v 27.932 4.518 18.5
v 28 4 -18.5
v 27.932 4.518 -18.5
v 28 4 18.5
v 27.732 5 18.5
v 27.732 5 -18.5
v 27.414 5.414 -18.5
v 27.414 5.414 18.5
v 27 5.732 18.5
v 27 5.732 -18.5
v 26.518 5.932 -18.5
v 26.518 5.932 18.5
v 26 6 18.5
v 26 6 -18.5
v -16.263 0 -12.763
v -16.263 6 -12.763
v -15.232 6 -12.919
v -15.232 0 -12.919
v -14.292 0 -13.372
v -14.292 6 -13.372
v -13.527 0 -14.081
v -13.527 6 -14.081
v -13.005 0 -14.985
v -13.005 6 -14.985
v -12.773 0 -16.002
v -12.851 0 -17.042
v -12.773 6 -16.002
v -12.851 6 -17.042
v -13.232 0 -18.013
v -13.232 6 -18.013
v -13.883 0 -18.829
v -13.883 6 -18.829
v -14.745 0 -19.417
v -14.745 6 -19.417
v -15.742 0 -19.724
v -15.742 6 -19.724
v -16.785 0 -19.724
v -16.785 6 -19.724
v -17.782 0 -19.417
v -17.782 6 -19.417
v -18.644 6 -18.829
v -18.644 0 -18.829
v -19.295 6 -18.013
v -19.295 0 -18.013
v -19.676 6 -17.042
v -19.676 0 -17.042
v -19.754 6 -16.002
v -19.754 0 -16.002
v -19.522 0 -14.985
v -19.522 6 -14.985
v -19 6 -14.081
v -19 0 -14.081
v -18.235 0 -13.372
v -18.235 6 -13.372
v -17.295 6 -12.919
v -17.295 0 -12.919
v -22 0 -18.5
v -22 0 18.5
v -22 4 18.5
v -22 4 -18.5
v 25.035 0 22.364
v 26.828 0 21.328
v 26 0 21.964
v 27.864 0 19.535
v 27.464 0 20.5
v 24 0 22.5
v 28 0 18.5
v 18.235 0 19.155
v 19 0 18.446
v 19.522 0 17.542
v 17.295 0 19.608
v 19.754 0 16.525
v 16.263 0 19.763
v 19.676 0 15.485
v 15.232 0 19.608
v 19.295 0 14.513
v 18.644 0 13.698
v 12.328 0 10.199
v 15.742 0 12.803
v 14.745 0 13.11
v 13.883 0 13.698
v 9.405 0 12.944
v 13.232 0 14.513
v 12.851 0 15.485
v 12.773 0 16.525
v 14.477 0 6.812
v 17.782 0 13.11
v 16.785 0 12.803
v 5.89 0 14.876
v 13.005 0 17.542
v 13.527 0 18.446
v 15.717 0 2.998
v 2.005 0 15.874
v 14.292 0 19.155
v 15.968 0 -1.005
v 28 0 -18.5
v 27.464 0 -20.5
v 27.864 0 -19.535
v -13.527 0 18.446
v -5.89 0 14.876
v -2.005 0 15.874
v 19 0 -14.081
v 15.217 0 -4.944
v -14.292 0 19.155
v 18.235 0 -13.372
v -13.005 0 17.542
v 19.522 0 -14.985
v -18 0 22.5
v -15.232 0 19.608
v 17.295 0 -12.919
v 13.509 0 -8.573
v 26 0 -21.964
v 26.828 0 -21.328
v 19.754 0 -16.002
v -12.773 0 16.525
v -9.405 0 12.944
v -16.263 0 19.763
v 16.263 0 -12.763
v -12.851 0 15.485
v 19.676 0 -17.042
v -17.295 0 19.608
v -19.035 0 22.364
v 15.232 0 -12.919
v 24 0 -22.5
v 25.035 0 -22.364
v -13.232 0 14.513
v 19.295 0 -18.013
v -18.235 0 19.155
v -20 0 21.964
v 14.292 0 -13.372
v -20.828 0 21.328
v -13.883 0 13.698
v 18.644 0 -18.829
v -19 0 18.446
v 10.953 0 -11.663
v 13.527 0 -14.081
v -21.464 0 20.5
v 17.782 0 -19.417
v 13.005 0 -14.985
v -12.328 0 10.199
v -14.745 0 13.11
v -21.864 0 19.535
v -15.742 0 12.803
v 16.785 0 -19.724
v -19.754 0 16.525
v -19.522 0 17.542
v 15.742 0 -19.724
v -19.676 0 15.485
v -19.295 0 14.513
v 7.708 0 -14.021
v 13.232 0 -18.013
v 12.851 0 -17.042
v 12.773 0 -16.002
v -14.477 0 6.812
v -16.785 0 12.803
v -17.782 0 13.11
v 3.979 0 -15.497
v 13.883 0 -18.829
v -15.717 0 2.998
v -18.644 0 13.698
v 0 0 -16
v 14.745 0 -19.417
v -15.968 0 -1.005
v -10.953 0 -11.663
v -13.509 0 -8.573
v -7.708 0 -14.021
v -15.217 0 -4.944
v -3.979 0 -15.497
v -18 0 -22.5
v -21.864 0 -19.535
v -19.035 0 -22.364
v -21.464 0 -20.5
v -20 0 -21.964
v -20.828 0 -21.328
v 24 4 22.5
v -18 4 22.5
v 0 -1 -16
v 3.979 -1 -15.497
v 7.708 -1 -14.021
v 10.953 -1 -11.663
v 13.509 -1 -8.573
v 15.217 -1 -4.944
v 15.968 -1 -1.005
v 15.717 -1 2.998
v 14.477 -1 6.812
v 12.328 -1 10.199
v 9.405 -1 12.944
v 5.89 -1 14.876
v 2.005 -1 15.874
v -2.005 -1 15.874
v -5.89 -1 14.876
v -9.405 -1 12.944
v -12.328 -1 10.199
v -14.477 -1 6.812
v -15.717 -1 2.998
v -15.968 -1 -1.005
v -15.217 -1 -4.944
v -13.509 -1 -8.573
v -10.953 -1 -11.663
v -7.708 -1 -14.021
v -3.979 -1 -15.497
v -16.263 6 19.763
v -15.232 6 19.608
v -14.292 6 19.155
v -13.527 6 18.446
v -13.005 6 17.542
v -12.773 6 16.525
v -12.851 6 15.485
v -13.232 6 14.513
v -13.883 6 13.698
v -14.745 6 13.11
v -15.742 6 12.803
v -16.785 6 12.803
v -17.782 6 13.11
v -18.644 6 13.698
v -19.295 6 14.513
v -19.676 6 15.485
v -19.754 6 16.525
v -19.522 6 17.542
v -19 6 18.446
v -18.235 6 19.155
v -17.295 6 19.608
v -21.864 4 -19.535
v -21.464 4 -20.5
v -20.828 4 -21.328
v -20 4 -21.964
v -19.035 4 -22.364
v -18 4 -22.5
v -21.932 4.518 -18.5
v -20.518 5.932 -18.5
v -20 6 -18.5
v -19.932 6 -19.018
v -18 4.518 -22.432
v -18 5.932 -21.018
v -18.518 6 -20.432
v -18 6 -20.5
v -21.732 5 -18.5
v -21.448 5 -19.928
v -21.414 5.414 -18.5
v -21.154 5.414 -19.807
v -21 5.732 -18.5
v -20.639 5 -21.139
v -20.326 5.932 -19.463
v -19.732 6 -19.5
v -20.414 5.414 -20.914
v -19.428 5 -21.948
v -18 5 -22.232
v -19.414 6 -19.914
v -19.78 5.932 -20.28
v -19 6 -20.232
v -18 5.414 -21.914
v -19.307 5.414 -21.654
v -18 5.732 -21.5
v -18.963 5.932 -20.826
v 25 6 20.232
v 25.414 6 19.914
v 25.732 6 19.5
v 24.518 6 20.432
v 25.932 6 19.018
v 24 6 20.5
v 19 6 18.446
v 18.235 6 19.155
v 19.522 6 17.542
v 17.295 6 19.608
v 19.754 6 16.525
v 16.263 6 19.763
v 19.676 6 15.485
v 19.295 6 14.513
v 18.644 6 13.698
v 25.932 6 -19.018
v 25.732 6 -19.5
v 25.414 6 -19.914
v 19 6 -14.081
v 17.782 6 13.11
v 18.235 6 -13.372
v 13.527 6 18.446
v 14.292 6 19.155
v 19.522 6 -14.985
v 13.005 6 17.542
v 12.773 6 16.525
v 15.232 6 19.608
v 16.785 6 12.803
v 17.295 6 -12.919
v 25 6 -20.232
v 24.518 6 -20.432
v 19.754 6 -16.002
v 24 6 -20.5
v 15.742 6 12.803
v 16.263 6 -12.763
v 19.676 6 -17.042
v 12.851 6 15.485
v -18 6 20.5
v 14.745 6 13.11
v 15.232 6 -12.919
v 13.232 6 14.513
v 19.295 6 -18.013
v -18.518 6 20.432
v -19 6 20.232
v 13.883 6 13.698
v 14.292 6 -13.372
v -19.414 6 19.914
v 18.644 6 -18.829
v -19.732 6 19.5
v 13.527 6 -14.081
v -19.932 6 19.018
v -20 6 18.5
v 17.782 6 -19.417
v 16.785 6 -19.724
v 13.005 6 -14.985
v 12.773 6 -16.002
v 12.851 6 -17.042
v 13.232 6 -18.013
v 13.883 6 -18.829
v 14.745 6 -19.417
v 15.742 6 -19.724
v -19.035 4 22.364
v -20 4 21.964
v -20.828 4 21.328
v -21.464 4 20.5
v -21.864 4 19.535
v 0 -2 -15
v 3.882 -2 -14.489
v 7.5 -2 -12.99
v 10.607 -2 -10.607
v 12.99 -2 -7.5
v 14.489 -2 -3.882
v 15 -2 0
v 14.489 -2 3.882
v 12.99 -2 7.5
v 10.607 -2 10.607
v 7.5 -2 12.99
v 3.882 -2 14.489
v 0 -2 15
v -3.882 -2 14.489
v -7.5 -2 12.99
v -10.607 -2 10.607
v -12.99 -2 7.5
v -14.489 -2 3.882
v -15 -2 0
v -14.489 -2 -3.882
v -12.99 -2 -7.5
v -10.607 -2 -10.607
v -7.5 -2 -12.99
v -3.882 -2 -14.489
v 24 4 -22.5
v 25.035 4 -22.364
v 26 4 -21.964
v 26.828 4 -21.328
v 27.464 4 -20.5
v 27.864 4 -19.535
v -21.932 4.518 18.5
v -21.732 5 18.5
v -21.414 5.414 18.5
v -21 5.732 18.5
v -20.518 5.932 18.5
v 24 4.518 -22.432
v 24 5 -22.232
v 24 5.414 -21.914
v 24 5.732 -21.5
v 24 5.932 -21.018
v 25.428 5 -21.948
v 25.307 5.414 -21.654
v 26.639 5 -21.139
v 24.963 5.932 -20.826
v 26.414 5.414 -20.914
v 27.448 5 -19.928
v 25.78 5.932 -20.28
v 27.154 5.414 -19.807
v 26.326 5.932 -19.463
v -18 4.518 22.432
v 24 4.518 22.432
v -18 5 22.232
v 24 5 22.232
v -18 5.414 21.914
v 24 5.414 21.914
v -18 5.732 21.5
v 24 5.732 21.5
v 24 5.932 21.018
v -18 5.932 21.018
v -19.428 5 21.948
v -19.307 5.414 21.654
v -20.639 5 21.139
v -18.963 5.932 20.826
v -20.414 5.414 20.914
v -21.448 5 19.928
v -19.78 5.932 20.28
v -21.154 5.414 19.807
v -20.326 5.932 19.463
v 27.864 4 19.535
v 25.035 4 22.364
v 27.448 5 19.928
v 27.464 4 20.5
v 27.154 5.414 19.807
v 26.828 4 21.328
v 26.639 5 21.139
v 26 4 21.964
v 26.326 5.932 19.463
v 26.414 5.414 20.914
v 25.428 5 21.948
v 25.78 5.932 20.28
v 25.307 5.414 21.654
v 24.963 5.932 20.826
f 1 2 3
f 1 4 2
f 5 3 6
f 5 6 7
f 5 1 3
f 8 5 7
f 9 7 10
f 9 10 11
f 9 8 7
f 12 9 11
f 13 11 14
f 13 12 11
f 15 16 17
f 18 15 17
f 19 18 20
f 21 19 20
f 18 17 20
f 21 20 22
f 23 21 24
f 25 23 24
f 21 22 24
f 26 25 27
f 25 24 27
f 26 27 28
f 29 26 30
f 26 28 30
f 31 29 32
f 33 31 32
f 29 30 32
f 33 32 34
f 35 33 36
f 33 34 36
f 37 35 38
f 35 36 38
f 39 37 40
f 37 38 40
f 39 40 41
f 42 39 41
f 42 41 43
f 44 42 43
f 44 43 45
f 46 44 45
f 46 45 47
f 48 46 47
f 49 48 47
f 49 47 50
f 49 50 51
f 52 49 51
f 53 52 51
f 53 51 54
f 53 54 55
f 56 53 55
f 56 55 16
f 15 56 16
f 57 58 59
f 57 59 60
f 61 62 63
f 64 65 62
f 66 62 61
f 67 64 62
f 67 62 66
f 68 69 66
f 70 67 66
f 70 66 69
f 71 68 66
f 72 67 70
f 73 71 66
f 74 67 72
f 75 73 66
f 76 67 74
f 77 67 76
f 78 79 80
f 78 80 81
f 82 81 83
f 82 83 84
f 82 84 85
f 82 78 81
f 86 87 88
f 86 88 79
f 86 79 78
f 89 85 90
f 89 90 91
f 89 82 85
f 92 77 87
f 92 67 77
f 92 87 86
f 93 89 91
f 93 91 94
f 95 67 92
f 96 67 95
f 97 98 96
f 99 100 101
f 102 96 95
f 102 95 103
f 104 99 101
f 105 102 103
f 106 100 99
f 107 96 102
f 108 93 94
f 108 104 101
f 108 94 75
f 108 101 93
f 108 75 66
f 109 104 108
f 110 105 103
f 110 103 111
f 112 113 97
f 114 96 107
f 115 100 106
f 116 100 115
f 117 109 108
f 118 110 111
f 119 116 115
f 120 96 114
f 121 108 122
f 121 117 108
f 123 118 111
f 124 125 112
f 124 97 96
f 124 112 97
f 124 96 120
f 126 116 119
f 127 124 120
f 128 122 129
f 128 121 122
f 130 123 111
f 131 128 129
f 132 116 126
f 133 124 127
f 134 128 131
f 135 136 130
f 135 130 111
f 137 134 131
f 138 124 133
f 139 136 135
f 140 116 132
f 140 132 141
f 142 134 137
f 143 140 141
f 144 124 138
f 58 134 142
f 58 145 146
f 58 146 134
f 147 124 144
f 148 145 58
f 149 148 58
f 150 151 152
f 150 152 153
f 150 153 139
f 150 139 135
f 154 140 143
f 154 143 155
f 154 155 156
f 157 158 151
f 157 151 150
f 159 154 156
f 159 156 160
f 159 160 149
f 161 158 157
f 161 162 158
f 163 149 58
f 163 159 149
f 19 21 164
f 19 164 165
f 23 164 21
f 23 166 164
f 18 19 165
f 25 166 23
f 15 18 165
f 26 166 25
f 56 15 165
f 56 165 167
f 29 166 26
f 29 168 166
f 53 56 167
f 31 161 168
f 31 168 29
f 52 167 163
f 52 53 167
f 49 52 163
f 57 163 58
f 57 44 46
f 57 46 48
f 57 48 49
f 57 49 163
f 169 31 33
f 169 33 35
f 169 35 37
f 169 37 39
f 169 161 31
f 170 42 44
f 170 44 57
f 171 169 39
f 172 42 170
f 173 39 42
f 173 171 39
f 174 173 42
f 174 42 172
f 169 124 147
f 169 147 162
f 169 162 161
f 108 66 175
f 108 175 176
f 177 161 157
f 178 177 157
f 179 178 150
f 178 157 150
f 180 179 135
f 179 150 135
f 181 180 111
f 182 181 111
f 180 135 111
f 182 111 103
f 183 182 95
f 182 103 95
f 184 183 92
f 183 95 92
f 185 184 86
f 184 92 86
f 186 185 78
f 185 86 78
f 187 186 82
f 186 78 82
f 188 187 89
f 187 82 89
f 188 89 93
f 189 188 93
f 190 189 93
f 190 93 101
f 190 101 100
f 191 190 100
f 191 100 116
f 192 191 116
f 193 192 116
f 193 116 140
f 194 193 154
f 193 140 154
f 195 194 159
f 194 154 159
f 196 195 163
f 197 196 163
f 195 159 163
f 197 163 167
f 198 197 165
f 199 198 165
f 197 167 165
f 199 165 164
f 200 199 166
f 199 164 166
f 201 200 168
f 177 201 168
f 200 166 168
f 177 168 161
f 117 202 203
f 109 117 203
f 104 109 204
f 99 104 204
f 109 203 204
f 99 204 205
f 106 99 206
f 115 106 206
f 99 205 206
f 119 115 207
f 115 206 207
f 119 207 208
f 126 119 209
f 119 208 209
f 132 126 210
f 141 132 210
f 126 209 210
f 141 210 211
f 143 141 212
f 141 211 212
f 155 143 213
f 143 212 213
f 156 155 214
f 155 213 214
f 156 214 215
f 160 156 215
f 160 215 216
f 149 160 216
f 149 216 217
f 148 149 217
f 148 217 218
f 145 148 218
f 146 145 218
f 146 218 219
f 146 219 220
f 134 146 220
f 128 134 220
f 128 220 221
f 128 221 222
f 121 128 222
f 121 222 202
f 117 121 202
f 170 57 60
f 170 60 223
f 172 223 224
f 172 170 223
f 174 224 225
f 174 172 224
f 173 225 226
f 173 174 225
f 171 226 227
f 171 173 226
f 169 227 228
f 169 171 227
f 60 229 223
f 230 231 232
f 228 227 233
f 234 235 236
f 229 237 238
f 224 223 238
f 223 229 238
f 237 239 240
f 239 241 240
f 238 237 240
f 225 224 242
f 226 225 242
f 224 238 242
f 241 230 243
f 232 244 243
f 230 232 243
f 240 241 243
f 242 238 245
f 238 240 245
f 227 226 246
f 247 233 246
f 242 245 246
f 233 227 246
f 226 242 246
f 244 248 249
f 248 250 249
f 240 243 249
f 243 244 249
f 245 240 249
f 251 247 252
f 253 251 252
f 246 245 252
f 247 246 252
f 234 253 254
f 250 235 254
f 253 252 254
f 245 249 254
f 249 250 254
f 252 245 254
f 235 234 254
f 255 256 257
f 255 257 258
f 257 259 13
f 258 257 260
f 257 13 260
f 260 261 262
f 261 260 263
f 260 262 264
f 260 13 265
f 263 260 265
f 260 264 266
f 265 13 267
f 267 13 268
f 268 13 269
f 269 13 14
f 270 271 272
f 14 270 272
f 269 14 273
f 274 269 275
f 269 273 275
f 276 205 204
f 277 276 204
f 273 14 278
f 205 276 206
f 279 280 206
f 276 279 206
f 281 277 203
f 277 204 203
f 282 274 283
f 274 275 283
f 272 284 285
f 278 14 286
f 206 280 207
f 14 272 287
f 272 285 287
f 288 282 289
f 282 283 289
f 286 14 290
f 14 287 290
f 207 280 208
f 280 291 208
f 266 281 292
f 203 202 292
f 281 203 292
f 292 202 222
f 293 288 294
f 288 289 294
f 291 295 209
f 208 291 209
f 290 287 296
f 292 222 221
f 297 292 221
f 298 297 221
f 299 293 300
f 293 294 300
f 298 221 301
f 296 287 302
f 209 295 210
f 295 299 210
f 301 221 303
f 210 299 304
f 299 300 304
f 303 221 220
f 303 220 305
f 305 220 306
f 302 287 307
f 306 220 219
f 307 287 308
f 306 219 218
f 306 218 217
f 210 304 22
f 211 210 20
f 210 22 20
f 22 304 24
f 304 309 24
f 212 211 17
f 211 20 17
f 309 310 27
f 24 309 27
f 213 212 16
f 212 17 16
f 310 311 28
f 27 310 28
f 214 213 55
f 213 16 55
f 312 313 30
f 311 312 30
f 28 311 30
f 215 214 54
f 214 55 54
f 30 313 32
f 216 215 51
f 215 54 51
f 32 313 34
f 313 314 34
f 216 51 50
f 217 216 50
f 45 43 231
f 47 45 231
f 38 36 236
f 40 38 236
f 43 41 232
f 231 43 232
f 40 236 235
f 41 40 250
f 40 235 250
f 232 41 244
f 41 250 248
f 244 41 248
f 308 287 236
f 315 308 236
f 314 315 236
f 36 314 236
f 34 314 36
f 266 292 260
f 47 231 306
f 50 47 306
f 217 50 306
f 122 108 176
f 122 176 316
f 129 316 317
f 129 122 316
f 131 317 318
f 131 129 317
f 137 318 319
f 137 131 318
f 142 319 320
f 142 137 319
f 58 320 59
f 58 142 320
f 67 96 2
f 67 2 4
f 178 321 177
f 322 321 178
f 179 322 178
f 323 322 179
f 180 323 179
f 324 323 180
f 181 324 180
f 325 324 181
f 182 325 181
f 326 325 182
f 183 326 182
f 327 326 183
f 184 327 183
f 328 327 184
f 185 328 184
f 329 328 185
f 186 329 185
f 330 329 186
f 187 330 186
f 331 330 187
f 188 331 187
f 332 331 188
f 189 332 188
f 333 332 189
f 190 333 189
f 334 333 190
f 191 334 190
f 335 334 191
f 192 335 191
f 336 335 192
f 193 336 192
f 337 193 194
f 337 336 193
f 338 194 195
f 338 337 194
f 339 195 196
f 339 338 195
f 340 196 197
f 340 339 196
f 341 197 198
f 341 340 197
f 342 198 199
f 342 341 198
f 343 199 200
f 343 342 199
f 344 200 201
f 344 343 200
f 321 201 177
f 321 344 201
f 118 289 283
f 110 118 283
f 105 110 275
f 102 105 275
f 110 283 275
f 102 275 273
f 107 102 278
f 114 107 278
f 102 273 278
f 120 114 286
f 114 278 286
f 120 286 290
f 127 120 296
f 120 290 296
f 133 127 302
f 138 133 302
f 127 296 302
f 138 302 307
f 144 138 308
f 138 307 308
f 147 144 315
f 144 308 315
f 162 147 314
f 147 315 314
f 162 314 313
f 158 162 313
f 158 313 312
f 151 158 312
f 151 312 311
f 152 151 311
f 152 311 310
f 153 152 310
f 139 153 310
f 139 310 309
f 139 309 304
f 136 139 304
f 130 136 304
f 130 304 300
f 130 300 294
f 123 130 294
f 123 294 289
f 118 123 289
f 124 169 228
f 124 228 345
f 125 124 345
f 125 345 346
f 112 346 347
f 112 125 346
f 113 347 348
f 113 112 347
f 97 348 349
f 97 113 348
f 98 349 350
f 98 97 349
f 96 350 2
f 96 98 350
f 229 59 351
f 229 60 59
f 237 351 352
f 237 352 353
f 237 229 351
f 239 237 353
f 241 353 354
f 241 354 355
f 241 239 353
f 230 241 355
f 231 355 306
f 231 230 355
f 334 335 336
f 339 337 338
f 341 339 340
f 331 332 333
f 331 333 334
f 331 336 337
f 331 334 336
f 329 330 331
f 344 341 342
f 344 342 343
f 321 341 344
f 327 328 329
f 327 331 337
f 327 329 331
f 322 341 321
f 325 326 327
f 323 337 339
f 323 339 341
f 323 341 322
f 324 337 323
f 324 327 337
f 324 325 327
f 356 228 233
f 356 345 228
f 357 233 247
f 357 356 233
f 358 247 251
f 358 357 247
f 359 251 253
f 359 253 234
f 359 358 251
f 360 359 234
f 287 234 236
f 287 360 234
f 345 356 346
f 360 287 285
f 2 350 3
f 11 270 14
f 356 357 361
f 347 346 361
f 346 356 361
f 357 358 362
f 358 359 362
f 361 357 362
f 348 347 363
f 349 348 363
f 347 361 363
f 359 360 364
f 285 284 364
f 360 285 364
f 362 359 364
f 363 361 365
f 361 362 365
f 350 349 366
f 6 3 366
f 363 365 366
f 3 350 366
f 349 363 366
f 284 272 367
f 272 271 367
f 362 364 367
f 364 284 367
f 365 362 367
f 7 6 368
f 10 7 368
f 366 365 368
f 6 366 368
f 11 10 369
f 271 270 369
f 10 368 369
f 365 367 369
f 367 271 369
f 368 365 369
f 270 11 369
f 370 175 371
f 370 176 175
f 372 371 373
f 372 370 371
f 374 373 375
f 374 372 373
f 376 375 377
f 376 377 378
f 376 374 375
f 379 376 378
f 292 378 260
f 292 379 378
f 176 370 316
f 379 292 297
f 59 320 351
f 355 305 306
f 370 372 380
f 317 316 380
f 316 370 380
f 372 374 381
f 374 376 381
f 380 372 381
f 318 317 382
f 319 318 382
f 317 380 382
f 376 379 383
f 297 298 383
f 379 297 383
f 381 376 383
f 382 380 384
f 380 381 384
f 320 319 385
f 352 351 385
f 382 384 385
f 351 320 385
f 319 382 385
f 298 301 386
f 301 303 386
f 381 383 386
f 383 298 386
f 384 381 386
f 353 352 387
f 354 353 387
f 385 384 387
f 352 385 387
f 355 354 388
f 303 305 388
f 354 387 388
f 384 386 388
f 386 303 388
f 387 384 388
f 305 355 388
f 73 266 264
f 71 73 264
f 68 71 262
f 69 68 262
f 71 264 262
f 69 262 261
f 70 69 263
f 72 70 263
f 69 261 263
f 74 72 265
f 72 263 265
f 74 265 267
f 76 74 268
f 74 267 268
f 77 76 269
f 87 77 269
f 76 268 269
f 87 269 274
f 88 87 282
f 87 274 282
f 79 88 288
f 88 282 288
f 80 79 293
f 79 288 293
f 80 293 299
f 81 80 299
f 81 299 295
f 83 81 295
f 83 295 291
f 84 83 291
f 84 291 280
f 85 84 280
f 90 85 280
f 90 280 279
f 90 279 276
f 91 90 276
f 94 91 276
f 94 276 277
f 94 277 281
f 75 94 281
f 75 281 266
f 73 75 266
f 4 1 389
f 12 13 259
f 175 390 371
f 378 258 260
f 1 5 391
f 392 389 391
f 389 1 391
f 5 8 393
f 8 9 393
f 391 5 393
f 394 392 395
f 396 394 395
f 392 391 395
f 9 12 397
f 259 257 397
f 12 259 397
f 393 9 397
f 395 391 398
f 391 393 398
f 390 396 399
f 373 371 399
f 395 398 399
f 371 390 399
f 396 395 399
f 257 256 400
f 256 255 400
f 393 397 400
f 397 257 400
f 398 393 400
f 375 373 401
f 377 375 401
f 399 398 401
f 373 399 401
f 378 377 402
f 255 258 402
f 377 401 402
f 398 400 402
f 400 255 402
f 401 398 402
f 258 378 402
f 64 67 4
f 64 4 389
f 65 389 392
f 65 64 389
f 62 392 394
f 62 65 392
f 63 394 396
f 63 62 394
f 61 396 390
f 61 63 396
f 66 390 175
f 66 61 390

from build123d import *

# Parameters (mm, degrees)
BOSS_EXTRUDE1_DEPTH = 6
FILLET1_R           = 2
SKETCH2_R           = 16
BOSS_EXTRUDE2_DEPTH = 2
CHAMFER1_SIZE       = 1
SKETCH3_R           = 3.5
CUT_EXTRUDE1_DEPTH  = 37.800135869


with BuildPart() as part:
    # Sketch1 → Boss-Extrude1 (new body)
    with BuildSketch(Plane(origin=(0, 0, 0), x_dir=(1, 0, 0), z_dir=(0, 1, 0))):
        with BuildLine():
            Line((-18, 22.5), (24, 22.5))
            ThreePointArc((24, 22.5), (26.828427125, 21.328427125), (28, 18.5))
            Line((28, 18.5), (28, -18.5))
            ThreePointArc((28, -18.5), (26.828427125, -21.328427125), (24, -22.5))
            Line((24, -22.5), (-18, -22.5))
            ThreePointArc((-18, -22.5), (-20.828427125, -21.328427125), (-22, -18.5))
            Line((-22, -18.5), (-22, 18.5))
            ThreePointArc((-22, 18.5), (-20.828427125, 21.328427125), (-18, 22.5))
        make_face()
    extrude(amount=BOSS_EXTRUDE1_DEPTH)

    # Fillet1
    fillet1_edges = [part.edges().sort_by_distance(p)[0] for p in [
        (-20.828427125, 6, -21.328427125),
        (-22, 6, 0),
        (-20.828427125, 6, 21.328427125),
        (3, 6, 22.5),
        (26.828427125, 6, 21.328427125),
        (28, 6, 0),
        (26.828427125, 6, -21.328427125),
        (3, 6, -22.5),
    ]]
    fillet(fillet1_edges, radius=FILLET1_R)

    # Sketch2 → Boss-Extrude2 (add)
    with BuildSketch(Plane.XZ):
        with Locations(Location((0, 0, 0), (0, 0, 270))):
            Circle(SKETCH2_R)
    extrude(amount=BOSS_EXTRUDE2_DEPTH)

    # Chamfer1
    chamfer1_edges = [part.edges().sort_by_distance(p)[0] for p in [
        (0, -2, 16),
    ]]
    chamfer(chamfer1_edges, length=CHAMFER1_SIZE)

    # Sketch3 → Cut-Extrude1 (cut, through all)
    with BuildSketch(Plane(origin=(0, 6, 0), x_dir=(1, 0, 0), z_dir=(0, 1, 0))):
        with Locations(Location((-16.263455967, 16.263455967, 0), (0, 0, 270))):
            Circle(SKETCH3_R)
        with Locations(Location((16.263455967, 16.263455967, 0), (0, 0, 270))):
            Circle(SKETCH3_R)
        with Locations(Location((16.263455967, -16.263455967, 0), (0, 0, 270))):
            Circle(SKETCH3_R)
        with Locations(Location((-16.263455967, -16.263455967, 0), (0, 0, 270))):
            Circle(SKETCH3_R)
    extrude(amount=-CUT_EXTRUDE1_DEPTH, mode=Mode.SUBTRACT)


solid = part.part
